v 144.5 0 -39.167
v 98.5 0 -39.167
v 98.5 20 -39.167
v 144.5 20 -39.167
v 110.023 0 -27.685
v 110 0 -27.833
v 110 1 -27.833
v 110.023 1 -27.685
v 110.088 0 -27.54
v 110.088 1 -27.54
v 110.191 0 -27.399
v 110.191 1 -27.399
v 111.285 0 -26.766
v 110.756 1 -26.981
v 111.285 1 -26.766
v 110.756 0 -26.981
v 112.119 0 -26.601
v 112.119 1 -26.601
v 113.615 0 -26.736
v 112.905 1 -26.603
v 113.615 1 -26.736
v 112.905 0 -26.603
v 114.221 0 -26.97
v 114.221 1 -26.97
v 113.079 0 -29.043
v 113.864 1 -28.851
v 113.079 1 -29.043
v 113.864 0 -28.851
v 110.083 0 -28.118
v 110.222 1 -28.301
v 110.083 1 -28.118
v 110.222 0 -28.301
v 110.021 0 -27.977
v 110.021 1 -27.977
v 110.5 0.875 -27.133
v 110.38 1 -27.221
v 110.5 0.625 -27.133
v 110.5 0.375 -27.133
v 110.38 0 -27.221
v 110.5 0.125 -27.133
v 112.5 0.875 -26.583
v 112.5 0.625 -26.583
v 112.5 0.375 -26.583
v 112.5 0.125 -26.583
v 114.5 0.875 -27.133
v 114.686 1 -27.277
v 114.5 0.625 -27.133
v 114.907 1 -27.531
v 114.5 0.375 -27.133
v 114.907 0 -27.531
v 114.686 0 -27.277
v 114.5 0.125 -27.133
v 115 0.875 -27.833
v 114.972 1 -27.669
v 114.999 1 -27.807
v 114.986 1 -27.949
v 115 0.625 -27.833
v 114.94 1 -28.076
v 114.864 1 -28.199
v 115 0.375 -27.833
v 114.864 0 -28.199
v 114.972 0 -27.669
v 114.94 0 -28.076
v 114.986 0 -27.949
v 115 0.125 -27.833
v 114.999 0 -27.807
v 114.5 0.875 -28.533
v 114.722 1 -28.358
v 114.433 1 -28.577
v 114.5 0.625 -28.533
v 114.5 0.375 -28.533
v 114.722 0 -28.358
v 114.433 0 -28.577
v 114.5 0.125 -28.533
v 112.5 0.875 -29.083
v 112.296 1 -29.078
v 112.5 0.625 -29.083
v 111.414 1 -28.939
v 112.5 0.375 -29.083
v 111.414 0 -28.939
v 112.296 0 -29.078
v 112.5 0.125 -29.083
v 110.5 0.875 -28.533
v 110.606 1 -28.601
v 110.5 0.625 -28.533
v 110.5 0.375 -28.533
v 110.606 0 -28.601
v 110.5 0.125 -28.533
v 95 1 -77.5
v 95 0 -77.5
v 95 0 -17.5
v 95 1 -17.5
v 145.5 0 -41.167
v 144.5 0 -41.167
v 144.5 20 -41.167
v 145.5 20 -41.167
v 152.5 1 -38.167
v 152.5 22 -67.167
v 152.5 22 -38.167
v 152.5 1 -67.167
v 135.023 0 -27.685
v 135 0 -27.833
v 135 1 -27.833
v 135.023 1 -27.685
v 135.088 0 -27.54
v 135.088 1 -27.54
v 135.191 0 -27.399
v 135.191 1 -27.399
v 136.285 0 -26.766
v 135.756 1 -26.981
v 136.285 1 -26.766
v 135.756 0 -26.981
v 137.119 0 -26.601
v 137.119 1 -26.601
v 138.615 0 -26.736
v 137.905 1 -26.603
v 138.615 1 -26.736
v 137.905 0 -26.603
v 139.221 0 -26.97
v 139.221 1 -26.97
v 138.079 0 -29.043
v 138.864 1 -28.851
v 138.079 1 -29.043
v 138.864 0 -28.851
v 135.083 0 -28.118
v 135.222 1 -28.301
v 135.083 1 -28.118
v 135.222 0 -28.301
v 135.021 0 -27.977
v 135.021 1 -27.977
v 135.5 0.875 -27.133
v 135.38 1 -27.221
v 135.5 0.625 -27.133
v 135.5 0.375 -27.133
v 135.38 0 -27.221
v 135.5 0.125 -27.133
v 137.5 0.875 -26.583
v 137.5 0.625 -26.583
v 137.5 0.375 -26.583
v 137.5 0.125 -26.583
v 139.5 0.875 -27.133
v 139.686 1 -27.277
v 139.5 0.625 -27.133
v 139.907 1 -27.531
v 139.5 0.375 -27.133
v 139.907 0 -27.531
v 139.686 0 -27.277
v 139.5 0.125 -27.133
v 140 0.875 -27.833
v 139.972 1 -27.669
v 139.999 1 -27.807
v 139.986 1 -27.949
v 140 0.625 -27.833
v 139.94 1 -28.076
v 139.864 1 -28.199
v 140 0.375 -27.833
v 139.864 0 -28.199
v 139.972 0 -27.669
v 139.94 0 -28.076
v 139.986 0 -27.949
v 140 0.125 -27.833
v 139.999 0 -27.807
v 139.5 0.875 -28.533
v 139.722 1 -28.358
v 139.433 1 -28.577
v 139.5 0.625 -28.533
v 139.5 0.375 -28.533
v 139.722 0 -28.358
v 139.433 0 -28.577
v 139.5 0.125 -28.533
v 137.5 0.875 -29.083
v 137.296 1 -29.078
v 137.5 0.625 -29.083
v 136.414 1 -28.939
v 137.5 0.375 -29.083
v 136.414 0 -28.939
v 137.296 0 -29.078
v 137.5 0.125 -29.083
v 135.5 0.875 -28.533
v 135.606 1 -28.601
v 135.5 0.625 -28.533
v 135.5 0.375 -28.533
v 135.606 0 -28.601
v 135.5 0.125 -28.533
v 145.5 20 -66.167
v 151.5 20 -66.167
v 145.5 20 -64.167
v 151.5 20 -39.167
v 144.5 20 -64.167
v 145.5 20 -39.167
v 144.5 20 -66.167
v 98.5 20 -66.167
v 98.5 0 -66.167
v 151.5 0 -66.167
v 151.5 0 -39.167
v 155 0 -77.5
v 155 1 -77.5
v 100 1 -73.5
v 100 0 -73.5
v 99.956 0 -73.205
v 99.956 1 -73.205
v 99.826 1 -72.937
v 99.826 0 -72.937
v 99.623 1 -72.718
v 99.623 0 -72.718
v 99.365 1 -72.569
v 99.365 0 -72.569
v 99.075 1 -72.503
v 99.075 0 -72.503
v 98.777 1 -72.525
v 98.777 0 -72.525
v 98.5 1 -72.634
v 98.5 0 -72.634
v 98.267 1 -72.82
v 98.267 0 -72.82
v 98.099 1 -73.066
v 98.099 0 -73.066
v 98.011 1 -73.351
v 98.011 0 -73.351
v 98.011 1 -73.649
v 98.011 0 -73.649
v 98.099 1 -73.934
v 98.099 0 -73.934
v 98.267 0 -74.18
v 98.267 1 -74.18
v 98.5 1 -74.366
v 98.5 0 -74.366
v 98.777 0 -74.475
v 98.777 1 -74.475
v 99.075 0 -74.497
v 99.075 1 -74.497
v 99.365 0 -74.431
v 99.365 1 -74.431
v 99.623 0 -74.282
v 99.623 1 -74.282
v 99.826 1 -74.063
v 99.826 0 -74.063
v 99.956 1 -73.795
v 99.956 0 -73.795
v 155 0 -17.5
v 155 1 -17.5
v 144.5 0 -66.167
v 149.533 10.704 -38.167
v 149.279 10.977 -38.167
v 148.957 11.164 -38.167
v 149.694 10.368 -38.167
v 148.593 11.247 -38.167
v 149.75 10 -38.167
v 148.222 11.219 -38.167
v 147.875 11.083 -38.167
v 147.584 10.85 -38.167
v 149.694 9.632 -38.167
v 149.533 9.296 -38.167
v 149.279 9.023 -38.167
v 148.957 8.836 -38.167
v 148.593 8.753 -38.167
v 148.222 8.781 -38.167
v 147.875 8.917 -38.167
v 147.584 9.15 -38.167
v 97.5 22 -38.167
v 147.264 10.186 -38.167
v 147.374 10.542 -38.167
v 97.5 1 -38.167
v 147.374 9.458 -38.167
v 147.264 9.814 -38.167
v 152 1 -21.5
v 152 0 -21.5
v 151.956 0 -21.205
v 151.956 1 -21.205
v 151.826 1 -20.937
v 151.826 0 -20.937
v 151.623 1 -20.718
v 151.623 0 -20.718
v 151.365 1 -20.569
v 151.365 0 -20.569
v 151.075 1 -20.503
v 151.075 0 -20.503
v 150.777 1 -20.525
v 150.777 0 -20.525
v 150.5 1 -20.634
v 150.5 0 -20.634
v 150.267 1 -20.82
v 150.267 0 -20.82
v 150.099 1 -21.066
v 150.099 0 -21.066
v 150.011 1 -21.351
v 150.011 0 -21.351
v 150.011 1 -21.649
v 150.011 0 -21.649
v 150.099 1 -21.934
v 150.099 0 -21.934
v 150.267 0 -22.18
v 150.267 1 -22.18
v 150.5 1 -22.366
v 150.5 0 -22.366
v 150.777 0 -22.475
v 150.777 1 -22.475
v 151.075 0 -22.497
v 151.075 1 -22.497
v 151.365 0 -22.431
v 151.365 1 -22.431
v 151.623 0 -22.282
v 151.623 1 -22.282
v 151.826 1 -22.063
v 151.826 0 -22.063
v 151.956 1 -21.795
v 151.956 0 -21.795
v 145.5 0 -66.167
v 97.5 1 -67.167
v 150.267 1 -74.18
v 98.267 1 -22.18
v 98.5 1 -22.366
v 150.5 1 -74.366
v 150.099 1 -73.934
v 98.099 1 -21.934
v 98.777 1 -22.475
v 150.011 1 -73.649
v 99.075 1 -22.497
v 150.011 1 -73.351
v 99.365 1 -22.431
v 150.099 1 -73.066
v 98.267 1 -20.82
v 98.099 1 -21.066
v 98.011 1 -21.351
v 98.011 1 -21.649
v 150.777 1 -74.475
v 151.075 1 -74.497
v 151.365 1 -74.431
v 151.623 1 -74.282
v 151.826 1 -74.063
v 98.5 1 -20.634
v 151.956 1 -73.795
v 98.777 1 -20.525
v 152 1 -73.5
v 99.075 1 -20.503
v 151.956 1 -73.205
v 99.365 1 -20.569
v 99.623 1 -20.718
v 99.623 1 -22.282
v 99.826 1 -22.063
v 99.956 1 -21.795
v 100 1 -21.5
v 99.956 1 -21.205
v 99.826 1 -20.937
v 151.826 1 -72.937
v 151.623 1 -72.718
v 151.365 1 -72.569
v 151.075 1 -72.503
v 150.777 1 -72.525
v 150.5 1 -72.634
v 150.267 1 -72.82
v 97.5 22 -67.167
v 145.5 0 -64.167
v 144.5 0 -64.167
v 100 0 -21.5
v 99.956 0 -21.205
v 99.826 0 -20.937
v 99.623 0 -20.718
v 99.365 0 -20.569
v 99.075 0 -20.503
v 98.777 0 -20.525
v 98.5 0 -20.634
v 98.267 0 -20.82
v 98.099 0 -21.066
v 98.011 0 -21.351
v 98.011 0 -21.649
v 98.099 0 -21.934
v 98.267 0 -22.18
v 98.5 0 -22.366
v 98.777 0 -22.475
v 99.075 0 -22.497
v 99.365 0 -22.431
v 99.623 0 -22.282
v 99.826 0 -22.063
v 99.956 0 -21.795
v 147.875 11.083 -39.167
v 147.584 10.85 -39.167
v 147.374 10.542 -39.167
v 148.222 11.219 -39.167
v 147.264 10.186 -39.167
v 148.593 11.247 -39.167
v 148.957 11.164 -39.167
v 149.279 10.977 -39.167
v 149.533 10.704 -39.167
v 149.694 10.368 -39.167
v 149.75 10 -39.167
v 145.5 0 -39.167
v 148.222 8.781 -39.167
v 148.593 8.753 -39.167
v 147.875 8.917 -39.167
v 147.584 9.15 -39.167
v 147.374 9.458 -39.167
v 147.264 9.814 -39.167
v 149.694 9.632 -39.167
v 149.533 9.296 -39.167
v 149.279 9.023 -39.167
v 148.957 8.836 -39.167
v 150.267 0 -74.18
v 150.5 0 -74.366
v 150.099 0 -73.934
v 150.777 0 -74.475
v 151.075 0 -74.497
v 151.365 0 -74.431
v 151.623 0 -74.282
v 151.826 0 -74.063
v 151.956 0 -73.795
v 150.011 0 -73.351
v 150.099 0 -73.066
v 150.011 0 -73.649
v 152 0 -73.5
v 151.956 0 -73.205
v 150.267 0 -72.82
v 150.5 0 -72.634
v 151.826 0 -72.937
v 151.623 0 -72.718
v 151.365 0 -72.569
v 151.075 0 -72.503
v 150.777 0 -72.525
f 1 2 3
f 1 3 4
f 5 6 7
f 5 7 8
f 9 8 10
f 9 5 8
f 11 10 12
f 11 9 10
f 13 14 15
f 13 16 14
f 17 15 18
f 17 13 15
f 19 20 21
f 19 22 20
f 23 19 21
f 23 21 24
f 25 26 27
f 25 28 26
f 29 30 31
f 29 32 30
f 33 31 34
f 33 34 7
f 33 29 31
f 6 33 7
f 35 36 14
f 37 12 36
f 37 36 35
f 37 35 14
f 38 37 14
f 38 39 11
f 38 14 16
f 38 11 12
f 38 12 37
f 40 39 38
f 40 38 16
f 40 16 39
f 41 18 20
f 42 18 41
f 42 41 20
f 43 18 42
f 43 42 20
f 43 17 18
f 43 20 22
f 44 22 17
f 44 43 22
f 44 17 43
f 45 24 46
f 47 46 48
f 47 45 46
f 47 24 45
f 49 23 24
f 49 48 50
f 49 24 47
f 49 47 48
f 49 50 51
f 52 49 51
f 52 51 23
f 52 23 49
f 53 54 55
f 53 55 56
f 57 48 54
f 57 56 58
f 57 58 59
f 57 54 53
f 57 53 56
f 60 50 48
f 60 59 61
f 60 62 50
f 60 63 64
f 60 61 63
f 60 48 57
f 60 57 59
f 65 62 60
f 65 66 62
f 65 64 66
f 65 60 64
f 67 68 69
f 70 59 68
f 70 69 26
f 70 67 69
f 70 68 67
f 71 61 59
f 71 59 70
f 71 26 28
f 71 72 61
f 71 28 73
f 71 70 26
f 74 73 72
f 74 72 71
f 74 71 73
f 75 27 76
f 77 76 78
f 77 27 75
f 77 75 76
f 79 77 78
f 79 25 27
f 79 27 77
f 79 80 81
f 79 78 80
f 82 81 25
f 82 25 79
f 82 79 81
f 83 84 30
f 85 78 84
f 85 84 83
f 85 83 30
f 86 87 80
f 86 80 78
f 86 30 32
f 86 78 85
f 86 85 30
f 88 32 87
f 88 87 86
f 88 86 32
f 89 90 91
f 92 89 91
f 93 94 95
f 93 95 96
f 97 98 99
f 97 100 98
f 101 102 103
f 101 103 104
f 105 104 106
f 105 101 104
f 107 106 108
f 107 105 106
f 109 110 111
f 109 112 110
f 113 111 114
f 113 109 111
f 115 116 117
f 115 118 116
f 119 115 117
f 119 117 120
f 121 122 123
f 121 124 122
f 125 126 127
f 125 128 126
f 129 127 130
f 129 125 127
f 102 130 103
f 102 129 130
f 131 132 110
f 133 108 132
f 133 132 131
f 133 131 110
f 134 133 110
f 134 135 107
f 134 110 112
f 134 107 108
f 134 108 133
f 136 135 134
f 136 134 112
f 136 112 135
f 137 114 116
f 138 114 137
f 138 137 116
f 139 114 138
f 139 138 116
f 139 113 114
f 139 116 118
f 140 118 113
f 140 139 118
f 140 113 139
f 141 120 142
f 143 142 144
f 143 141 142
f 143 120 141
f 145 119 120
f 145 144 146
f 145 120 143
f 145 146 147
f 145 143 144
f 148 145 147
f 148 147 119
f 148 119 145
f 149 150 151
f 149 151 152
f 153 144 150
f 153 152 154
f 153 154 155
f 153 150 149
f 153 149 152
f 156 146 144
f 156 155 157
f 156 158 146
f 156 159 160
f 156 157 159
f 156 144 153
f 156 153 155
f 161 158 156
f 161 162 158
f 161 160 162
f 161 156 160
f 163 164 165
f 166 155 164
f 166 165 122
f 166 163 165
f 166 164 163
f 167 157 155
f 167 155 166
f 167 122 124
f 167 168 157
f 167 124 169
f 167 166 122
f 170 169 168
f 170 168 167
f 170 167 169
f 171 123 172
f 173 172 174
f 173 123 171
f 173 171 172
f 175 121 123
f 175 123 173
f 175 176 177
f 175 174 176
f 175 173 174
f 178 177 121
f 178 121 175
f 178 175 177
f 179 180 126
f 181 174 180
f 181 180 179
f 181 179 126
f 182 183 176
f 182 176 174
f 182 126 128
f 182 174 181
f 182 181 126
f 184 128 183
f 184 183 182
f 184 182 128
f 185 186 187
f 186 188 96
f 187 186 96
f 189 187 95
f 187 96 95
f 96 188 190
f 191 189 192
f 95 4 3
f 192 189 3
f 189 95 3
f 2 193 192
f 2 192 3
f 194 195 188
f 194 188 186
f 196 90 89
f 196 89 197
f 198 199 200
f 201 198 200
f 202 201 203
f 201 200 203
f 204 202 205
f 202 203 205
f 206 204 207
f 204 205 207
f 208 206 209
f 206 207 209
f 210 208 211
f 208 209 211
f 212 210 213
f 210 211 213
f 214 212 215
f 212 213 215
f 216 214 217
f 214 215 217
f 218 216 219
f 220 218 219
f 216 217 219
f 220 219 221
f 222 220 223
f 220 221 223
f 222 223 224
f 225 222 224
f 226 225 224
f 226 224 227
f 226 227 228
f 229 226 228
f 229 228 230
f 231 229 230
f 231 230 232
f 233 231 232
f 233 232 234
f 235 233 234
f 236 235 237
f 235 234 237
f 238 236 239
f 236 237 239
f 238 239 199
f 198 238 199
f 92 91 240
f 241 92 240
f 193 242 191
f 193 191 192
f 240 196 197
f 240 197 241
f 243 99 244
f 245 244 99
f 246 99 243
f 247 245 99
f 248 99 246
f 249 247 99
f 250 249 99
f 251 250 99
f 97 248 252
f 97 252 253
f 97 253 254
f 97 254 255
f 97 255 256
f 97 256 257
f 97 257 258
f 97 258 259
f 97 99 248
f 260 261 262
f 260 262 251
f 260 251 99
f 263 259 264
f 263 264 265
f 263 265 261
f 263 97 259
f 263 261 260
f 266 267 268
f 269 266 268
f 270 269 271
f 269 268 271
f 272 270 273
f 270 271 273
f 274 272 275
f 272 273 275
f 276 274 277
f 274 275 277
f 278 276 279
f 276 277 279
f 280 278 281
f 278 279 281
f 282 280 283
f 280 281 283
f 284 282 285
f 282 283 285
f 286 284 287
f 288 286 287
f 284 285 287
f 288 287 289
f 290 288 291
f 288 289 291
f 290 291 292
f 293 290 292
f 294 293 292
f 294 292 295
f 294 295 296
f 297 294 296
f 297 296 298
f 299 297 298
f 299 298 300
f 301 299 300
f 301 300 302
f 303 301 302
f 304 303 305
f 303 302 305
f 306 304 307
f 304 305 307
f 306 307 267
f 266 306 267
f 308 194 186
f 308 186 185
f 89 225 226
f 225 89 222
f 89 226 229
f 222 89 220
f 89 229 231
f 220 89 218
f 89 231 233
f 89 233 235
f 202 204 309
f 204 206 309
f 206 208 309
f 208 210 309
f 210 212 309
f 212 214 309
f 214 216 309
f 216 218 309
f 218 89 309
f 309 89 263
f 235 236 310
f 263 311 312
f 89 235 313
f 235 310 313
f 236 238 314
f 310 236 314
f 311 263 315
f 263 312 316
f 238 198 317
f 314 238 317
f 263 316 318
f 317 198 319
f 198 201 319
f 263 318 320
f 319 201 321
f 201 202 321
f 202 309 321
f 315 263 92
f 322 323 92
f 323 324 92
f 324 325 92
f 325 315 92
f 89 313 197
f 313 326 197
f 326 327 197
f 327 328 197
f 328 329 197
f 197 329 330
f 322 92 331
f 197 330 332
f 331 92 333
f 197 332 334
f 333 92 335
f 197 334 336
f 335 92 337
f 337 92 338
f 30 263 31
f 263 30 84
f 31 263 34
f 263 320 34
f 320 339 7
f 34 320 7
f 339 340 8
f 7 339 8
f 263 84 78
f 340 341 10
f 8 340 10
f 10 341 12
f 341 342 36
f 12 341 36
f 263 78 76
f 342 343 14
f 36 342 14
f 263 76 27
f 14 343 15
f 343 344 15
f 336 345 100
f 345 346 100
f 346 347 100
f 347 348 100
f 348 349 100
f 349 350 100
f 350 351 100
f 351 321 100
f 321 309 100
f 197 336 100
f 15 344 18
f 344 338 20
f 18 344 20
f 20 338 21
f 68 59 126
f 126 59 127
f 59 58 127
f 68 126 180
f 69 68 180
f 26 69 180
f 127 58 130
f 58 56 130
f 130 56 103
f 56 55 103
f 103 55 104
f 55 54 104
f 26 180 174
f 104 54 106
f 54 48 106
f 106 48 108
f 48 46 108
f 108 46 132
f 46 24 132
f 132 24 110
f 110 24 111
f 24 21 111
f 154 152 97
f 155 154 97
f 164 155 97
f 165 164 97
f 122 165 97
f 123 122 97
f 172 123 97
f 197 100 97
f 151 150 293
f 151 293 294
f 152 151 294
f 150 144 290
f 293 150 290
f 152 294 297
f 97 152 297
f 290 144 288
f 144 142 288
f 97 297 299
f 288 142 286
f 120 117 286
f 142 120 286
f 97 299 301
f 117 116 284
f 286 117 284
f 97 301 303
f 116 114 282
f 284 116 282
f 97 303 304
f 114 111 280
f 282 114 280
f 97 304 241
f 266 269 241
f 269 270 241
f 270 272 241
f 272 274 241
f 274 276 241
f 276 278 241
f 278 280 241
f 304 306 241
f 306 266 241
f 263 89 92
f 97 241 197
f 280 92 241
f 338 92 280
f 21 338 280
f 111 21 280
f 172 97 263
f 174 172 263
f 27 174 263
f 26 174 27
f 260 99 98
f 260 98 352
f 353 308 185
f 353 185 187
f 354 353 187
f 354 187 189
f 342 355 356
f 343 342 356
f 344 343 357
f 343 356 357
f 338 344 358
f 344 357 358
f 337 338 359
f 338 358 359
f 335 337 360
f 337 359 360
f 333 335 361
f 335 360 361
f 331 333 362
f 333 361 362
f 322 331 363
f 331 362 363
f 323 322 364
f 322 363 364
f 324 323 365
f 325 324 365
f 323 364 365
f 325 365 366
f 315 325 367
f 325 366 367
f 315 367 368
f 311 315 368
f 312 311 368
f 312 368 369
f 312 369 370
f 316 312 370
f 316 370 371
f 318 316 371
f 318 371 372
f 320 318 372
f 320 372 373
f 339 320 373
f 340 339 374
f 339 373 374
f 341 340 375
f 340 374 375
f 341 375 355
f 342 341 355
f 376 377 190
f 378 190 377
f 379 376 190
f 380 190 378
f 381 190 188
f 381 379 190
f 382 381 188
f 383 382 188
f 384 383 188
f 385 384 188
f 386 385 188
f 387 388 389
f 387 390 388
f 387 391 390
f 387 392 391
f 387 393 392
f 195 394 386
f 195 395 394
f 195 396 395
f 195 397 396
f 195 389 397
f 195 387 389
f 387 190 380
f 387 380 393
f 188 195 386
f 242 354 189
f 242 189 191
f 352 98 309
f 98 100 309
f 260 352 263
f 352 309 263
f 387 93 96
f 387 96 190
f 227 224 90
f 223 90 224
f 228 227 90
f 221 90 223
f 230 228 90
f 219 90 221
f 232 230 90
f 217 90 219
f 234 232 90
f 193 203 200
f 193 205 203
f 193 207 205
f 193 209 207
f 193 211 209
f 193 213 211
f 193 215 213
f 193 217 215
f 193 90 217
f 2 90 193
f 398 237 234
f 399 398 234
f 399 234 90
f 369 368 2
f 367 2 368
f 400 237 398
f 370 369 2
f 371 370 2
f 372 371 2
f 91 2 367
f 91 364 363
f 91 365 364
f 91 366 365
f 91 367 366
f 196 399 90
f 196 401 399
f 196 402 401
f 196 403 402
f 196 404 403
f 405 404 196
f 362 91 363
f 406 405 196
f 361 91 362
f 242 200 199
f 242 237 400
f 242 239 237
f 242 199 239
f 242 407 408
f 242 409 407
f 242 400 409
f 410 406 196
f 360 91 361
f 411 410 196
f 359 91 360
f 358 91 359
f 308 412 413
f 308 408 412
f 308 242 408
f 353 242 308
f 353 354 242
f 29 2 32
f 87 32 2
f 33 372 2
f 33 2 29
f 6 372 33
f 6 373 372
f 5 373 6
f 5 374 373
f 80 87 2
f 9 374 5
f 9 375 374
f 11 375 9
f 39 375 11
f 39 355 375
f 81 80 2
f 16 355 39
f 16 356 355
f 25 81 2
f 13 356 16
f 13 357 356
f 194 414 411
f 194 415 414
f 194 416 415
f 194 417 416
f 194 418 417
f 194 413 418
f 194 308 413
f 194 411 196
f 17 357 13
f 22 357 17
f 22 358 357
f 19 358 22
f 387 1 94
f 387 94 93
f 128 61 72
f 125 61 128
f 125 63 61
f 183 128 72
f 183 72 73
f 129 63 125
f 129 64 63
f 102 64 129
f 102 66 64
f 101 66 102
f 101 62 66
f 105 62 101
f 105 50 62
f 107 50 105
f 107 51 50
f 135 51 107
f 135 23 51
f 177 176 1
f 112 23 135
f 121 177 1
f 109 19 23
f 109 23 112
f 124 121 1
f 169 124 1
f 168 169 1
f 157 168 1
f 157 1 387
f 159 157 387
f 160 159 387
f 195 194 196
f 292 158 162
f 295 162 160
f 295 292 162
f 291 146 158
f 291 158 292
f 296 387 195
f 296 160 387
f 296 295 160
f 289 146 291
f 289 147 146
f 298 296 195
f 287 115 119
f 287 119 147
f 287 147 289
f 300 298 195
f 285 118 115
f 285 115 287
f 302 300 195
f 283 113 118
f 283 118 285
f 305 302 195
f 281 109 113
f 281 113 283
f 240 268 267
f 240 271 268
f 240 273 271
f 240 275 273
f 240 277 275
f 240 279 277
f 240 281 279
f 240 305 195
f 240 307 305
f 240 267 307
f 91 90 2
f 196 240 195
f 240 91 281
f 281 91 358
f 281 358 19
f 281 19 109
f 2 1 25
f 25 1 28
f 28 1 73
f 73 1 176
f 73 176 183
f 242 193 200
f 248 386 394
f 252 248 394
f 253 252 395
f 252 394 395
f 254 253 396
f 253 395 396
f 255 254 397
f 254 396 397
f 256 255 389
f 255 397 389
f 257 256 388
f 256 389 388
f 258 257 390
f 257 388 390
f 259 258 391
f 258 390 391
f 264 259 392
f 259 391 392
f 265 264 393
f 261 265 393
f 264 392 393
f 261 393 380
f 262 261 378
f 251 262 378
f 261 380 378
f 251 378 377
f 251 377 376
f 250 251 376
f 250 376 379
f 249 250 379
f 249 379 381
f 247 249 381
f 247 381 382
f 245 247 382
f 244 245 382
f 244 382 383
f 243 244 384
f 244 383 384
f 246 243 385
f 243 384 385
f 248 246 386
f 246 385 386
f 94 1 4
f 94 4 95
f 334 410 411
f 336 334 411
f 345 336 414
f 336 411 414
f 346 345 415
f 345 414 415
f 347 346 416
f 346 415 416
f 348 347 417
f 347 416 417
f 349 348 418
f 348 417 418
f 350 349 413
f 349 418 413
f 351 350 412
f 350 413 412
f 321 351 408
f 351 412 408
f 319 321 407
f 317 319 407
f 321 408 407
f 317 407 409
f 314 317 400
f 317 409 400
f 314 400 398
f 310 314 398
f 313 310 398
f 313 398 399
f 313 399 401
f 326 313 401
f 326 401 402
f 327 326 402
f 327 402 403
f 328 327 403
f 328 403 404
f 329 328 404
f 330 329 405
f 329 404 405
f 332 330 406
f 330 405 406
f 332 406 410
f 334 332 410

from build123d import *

# Parameters (mm, degrees)
F0_W     = 60
F0_H     = 60
F0_R     = 1
F0_W_2   = 55
F0_H_2   = 29
F1_DEPTH = 1
F2_DEPTH = 20
F3_W     = 55
F3_H     = 29
F4_DEPTH = 2
F5_R     = 1.25
F6_DEPTH = 1


with BuildPart() as f1:
    # F0 (on Front) → F1 (new body)
    with BuildSketch(Plane.XZ):
        with Locations((125, -47.5)):
            Rectangle(F0_W, F0_H)
        with Locations((99, -73.5)):
            Circle(F0_R, mode=Mode.SUBTRACT)
        with BuildLine():
            add(Edge.make_bspline(
                [(115.5, -27.8333333333), (115.5053577108, -27.7788793608), (115.5046155164, -27.6173160698), (115.4229520333, -27.3159864687), (115.1694184757, -27.0083733137), (114.8396391927, -26.7320721453), (114.4565636597, -26.5055538646), (113.9744634164, -26.3044772096), (113.4434639551, -26.138395569), (112.9239685432, -26.0775980772), (112.622564856, -26.077294909), (112.5, -26.0833333333)],
                knots=[0, 0, 0, 0, 0.1634113073, 0.4836883399, 0.9124679887, 1.3341141703, 1.7731849289, 2.2406235312, 2.899707559, 3.4345550853, 3.8026975859, 3.8026975859, 3.8026975859, 3.8026975859], degree=3))
            add(Edge.make_bspline(
                [(115.5, -27.8333333333), (115.5053577108, -27.8877873059), (115.5046155164, -28.0493505969), (115.4229520333, -28.3506801979), (115.1694184757, -28.658293353), (114.8396391927, -28.9345945214), (114.4565636597, -29.1611128021), (113.9744634164, -29.3621894571), (113.4434639551, -29.5282710976), (112.9239685432, -29.5890685895), (112.622564856, -29.5893717577), (112.5, -29.5833333333)],
                knots=[0, 0, 0, 0, 0.1634113073, 0.4836883399, 0.9124679887, 1.3341141703, 1.7731849289, 2.2406235312, 2.899707559, 3.4345550853, 3.8026975859, 3.8026975859, 3.8026975859, 3.8026975859], degree=3))
            add(Edge.make_bspline(
                [(109.5, -27.8333333333), (109.4946422892, -27.8877873059), (109.4953844836, -28.0493505969), (109.5770479667, -28.350680198), (109.8305815243, -28.658293353), (110.1603608073, -28.9345945214), (110.5434363403, -29.1611128021), (111.0255365836, -29.3621894571), (111.5565360449, -29.5282710976), (112.0760314568, -29.5890685895), (112.377435144, -29.5893717577), (112.5, -29.5833333333)],
                knots=[0, 0, 0, 0, 0.1634113073, 0.4836883399, 0.9124679887, 1.3341141703, 1.7731849289, 2.2406235313, 2.899707559, 3.4345550853, 3.8026975859, 3.8026975859, 3.8026975859, 3.8026975859], degree=3))
            add(Edge.make_bspline(
                [(109.5, -27.8333333333), (109.4946422892, -27.7788793608), (109.4953844836, -27.6173160698), (109.5770479667, -27.3159864687), (109.8305815243, -27.0083733137), (110.1603608073, -26.7320721453), (110.5434363403, -26.5055538646), (111.0255365836, -26.3044772096), (111.5565360449, -26.138395569), (112.0760314568, -26.0775980772), (112.377435144, -26.077294909), (112.5, -26.0833333333)],
                knots=[0, 0, 0, 0, 0.1634113073, 0.4836883399, 0.9124679887, 1.3341141703, 1.7731849289, 2.2406235313, 2.899707559, 3.4345550853, 3.8026975859, 3.8026975859, 3.8026975859, 3.8026975859], degree=3))
        make_face(mode=Mode.SUBTRACT)
        with Locations((151, -73.5)):
            Circle(F0_R, mode=Mode.SUBTRACT)
        with Locations((125, -52.6666666667)):
            Rectangle(F0_W_2, F0_H_2, mode=Mode.SUBTRACT)
        with BuildLine():
            add(Edge.make_bspline(
                [(134.5, -27.8333333333), (134.4946422892, -27.8877873059), (134.4953844836, -28.0493505969), (134.5770479667, -28.3506801979), (134.8305815243, -28.658293353), (135.1603608073, -28.9345945214), (135.5434363403, -29.1611128021), (136.0255365836, -29.3621894571), (136.5565360449, -29.5282710976), (137.0760314568, -29.5890685895), (137.377435144, -29.5893717577), (137.5, -29.5833333333)],
                knots=[0, 0, 0, 0, 0.1634113073, 0.4836883399, 0.9124679887, 1.3341141703, 1.7731849289, 2.2406235312, 2.899707559, 3.4345550853, 3.8026975859, 3.8026975859, 3.8026975859, 3.8026975859], degree=3))
            add(Edge.make_bspline(
                [(134.5, -27.8333333333), (134.4946422892, -27.7788793608), (134.4953844836, -27.6173160698), (134.5770479667, -27.3159864687), (134.8305815243, -27.0083733137), (135.1603608073, -26.7320721453), (135.5434363403, -26.5055538646), (136.0255365836, -26.3044772096), (136.5565360449, -26.138395569), (137.0760314568, -26.0775980772), (137.377435144, -26.077294909), (137.5, -26.0833333333)],
                knots=[0, 0, 0, 0, 0.1634113073, 0.4836883399, 0.9124679887, 1.3341141703, 1.7731849289, 2.2406235312, 2.899707559, 3.4345550853, 3.8026975859, 3.8026975859, 3.8026975859, 3.8026975859], degree=3))
            add(Edge.make_bspline(
                [(140.5, -27.8333333333), (140.5053577108, -27.7788793608), (140.5046155164, -27.6173160698), (140.4229520333, -27.3159864687), (140.1694184757, -27.0083733137), (139.8396391927, -26.7320721453), (139.4565636597, -26.5055538646), (138.9744634164, -26.3044772096), (138.4434639551, -26.138395569), (137.9239685432, -26.0775980772), (137.622564856, -26.077294909), (137.5, -26.0833333333)],
                knots=[0, 0, 0, 0, 0.1634113073, 0.4836883399, 0.9124679887, 1.3341141703, 1.7731849289, 2.2406235313, 2.899707559, 3.4345550853, 3.8026975859, 3.8026975859, 3.8026975859, 3.8026975859], degree=3))
            add(Edge.make_bspline(
                [(140.5, -27.8333333333), (140.5053577108, -27.8877873059), (140.5046155164, -28.0493505969), (140.4229520333, -28.350680198), (140.1694184757, -28.658293353), (139.8396391927, -28.9345945214), (139.4565636597, -29.1611128021), (138.9744634164, -29.3621894571), (138.4434639551, -29.5282710976), (137.9239685432, -29.5890685895), (137.622564856, -29.5893717577), (137.5, -29.5833333333)],
                knots=[0, 0, 0, 0, 0.1634113073, 0.4836883399, 0.9124679887, 1.3341141703, 1.7731849289, 2.2406235313, 2.899707559, 3.4345550853, 3.8026975859, 3.8026975859, 3.8026975859, 3.8026975859], degree=3))
        make_face(mode=Mode.SUBTRACT)
        with Locations((99, -21.5)):
            Circle(F0_R, mode=Mode.SUBTRACT)
        with Locations((151, -21.5)):
            Circle(F0_R, mode=Mode.SUBTRACT)
        with BuildLine():
            add(Edge.make_bspline(
                [(115.5, -27.8333333333), (115.5053577108, -27.8877873059), (115.5046155164, -28.0493505969), (115.4229520333, -28.3506801979), (115.1694184757, -28.658293353), (114.8396391927, -28.9345945214), (114.4565636597, -29.1611128021), (113.9744634164, -29.3621894571), (113.4434639551, -29.5282710976), (112.9239685432, -29.5890685895), (112.622564856, -29.5893717577), (112.5, -29.5833333333)],
                knots=[0, 0, 0, 0, 0.1634113073, 0.4836883399, 0.9124679887, 1.3341141703, 1.7731849289, 2.2406235312, 2.899707559, 3.4345550853, 3.8026975859, 3.8026975859, 3.8026975859, 3.8026975859], degree=3))
            add(Edge.make_bspline(
                [(115.5, -27.8333333333), (115.5053577108, -27.7788793608), (115.5046155164, -27.6173160698), (115.4229520333, -27.3159864687), (115.1694184757, -27.0083733137), (114.8396391927, -26.7320721453), (114.4565636597, -26.5055538646), (113.9744634164, -26.3044772096), (113.4434639551, -26.138395569), (112.9239685432, -26.0775980772), (112.622564856, -26.077294909), (112.5, -26.0833333333)],
                knots=[0, 0, 0, 0, 0.1634113073, 0.4836883399, 0.9124679887, 1.3341141703, 1.7731849289, 2.2406235312, 2.899707559, 3.4345550853, 3.8026975859, 3.8026975859, 3.8026975859, 3.8026975859], degree=3))
            add(Edge.make_bspline(
                [(109.5, -27.8333333333), (109.4946422892, -27.7788793608), (109.4953844836, -27.6173160698), (109.5770479667, -27.3159864687), (109.8305815243, -27.0083733137), (110.1603608073, -26.7320721453), (110.5434363403, -26.5055538646), (111.0255365836, -26.3044772096), (111.5565360449, -26.138395569), (112.0760314568, -26.0775980772), (112.377435144, -26.077294909), (112.5, -26.0833333333)],
                knots=[0, 0, 0, 0, 0.1634113073, 0.4836883399, 0.9124679887, 1.3341141703, 1.7731849289, 2.2406235313, 2.899707559, 3.4345550853, 3.8026975859, 3.8026975859, 3.8026975859, 3.8026975859], degree=3))
            add(Edge.make_bspline(
                [(109.5, -27.8333333333), (109.4946422892, -27.8877873059), (109.4953844836, -28.0493505969), (109.5770479667, -28.350680198), (109.8305815243, -28.658293353), (110.1603608073, -28.9345945214), (110.5434363403, -29.1611128021), (111.0255365836, -29.3621894571), (111.5565360449, -29.5282710976), (112.0760314568, -29.5890685895), (112.377435144, -29.5893717577), (112.5, -29.5833333333)],
                knots=[0, 0, 0, 0, 0.1634113073, 0.4836883399, 0.9124679887, 1.3341141703, 1.7731849289, 2.2406235313, 2.899707559, 3.4345550853, 3.8026975859, 3.8026975859, 3.8026975859, 3.8026975859], degree=3))
        make_face()
        with BuildLine():
            add(Edge.make_bspline(
                [(110, -27.8333333333), (110, -28.0833333333), (110.5018133067, -28.705622104), (111.7, -29.0833333333), (112.5, -29.0833333333)],
                knots=[0, 0, 0, 0, 0.3917230185, 1, 1, 1, 1], degree=3))
            add(Edge.make_bspline(
                [(110, -27.8333333333), (110, -27.5833333333), (110.5018133067, -26.9610445627), (111.7, -26.5833333333), (112.5, -26.5833333333)],
                knots=[0, 0, 0, 0, 0.3917230185, 1, 1, 1, 1], degree=3))
            add(Edge.make_bspline(
                [(115, -27.8333333333), (115, -27.5833333333), (114.4981866933, -26.9610445627), (113.3, -26.5833333333), (112.5, -26.5833333333)],
                knots=[0, 0, 0, 0, 0.3917230185, 1, 1, 1, 1], degree=3))
            add(Edge.make_bspline(
                [(115, -27.8333333333), (115, -28.0833333333), (114.4981866933, -28.705622104), (113.3, -29.0833333333), (112.5, -29.0833333333)],
                knots=[0, 0, 0, 0, 0.3917230185, 1, 1, 1, 1], degree=3))
        make_face(mode=Mode.SUBTRACT)
        with BuildLine():
            add(Edge.make_bspline(
                [(134.5, -27.8333333333), (134.4946422892, -27.7788793608), (134.4953844836, -27.6173160698), (134.5770479667, -27.3159864687), (134.8305815243, -27.0083733137), (135.1603608073, -26.7320721453), (135.5434363403, -26.5055538646), (136.0255365836, -26.3044772096), (136.5565360449, -26.138395569), (137.0760314568, -26.0775980772), (137.377435144, -26.077294909), (137.5, -26.0833333333)],
                knots=[0, 0, 0, 0, 0.1634113073, 0.4836883399, 0.9124679887, 1.3341141703, 1.7731849289, 2.2406235312, 2.899707559, 3.4345550853, 3.8026975859, 3.8026975859, 3.8026975859, 3.8026975859], degree=3))
            add(Edge.make_bspline(
                [(134.5, -27.8333333333), (134.4946422892, -27.8877873059), (134.4953844836, -28.0493505969), (134.5770479667, -28.3506801979), (134.8305815243, -28.658293353), (135.1603608073, -28.9345945214), (135.5434363403, -29.1611128021), (136.0255365836, -29.3621894571), (136.5565360449, -29.5282710976), (137.0760314568, -29.5890685895), (137.377435144, -29.5893717577), (137.5, -29.5833333333)],
                knots=[0, 0, 0, 0, 0.1634113073, 0.4836883399, 0.9124679887, 1.3341141703, 1.7731849289, 2.2406235312, 2.899707559, 3.4345550853, 3.8026975859, 3.8026975859, 3.8026975859, 3.8026975859], degree=3))
            add(Edge.make_bspline(
                [(140.5, -27.8333333333), (140.5053577108, -27.8877873059), (140.5046155164, -28.0493505969), (140.4229520333, -28.350680198), (140.1694184757, -28.658293353), (139.8396391927, -28.9345945214), (139.4565636597, -29.1611128021), (138.9744634164, -29.3621894571), (138.4434639551, -29.5282710976), (137.9239685432, -29.5890685895), (137.622564856, -29.5893717577), (137.5, -29.5833333333)],
                knots=[0, 0, 0, 0, 0.1634113073, 0.4836883399, 0.9124679887, 1.3341141703, 1.7731849289, 2.2406235313, 2.899707559, 3.4345550853, 3.8026975859, 3.8026975859, 3.8026975859, 3.8026975859], degree=3))
            add(Edge.make_bspline(
                [(140.5, -27.8333333333), (140.5053577108, -27.7788793608), (140.5046155164, -27.6173160698), (140.4229520333, -27.3159864687), (140.1694184757, -27.0083733137), (139.8396391927, -26.7320721453), (139.4565636597, -26.5055538646), (138.9744634164, -26.3044772096), (138.4434639551, -26.138395569), (137.9239685432, -26.0775980772), (137.622564856, -26.077294909), (137.5, -26.0833333333)],
                knots=[0, 0, 0, 0, 0.1634113073, 0.4836883399, 0.9124679887, 1.3341141703, 1.7731849289, 2.2406235313, 2.899707559, 3.4345550853, 3.8026975859, 3.8026975859, 3.8026975859, 3.8026975859], degree=3))
        make_face()
        with BuildLine():
            add(Edge.make_bspline(
                [(135, -27.8333333333), (135, -28.0833333333), (135.5018133067, -28.705622104), (136.7, -29.0833333333), (137.5, -29.0833333333)],
                knots=[0, 0, 0, 0, 0.3917230185, 1, 1, 1, 1], degree=3))
            add(Edge.make_bspline(
                [(135, -27.8333333333), (135, -27.5833333333), (135.5018133067, -26.9610445627), (136.7, -26.5833333333), (137.5, -26.5833333333)],
                knots=[0, 0, 0, 0, 0.3917230185, 1, 1, 1, 1], degree=3))
            add(Edge.make_bspline(
                [(140, -27.8333333333), (140, -27.5833333333), (139.4981866933, -26.9610445627), (138.3, -26.5833333333), (137.5, -26.5833333333)],
                knots=[0, 0, 0, 0, 0.3917230185, 1, 1, 1, 1], degree=3))
            add(Edge.make_bspline(
                [(140, -27.8333333333), (140, -28.0833333333), (139.4981866933, -28.705622104), (138.3, -29.0833333333), (137.5, -29.0833333333)],
                knots=[0, 0, 0, 0, 0.3917230185, 1, 1, 1, 1], degree=3))
        make_face(mode=Mode.SUBTRACT)
        with Locations((125, -52.6666666667)):
            Rectangle(F0_W_2, F0_H_2)
        Polygon((98.5, -39.1666666667), (144.5, -39.1666666667), (144.5, -41.1666666667), (145.5, -41.1666666667), (145.5, -39.1666666667), (151.5, -39.1666666667), (151.5, -66.1666666667), (145.5, -66.1666666667), (145.5, -64.1666666667), (144.5, -64.1666666667), (144.5, -66.1666666667), (98.5, -66.1666666667), align=None, mode=Mode.SUBTRACT)
    extrude(amount=-F1_DEPTH)

    # F0 (on Front) → F2 (join)
    with BuildSketch(Plane.XZ):
        with Locations((125, -52.6666666667)):
            Rectangle(F0_W_2, F0_H_2)
        Polygon((98.5, -39.1666666667), (144.5, -39.1666666667), (144.5, -41.1666666667), (145.5, -41.1666666667), (145.5, -39.1666666667), (151.5, -39.1666666667), (151.5, -66.1666666667), (145.5, -66.1666666667), (145.5, -64.1666666667), (144.5, -64.1666666667), (144.5, -66.1666666667), (98.5, -66.1666666667), align=None, mode=Mode.SUBTRACT)
    extrude(amount=-F2_DEPTH)

    # F3 (on face) → F4 (join)
    with BuildSketch(Plane(origin=(0, 20, 0), x_dir=(-1, 0, 0), z_dir=(0, 1, 0))):
        with Locations((-125, -52.6666666667)):
            Rectangle(F3_W, F3_H)
    extrude(amount=F4_DEPTH)

    # F5 (on face) → F6 (cut, through all)
    with BuildSketch(Plane(origin=(0, 0, -39.1666666667), x_dir=(1, 0, 0), z_dir=(0, 0, -1))):
        with Locations((148.5, -10)):
            Circle(F5_R)
    extrude(amount=-F6_DEPTH, mode=Mode.SUBTRACT)


solid = f1.part
